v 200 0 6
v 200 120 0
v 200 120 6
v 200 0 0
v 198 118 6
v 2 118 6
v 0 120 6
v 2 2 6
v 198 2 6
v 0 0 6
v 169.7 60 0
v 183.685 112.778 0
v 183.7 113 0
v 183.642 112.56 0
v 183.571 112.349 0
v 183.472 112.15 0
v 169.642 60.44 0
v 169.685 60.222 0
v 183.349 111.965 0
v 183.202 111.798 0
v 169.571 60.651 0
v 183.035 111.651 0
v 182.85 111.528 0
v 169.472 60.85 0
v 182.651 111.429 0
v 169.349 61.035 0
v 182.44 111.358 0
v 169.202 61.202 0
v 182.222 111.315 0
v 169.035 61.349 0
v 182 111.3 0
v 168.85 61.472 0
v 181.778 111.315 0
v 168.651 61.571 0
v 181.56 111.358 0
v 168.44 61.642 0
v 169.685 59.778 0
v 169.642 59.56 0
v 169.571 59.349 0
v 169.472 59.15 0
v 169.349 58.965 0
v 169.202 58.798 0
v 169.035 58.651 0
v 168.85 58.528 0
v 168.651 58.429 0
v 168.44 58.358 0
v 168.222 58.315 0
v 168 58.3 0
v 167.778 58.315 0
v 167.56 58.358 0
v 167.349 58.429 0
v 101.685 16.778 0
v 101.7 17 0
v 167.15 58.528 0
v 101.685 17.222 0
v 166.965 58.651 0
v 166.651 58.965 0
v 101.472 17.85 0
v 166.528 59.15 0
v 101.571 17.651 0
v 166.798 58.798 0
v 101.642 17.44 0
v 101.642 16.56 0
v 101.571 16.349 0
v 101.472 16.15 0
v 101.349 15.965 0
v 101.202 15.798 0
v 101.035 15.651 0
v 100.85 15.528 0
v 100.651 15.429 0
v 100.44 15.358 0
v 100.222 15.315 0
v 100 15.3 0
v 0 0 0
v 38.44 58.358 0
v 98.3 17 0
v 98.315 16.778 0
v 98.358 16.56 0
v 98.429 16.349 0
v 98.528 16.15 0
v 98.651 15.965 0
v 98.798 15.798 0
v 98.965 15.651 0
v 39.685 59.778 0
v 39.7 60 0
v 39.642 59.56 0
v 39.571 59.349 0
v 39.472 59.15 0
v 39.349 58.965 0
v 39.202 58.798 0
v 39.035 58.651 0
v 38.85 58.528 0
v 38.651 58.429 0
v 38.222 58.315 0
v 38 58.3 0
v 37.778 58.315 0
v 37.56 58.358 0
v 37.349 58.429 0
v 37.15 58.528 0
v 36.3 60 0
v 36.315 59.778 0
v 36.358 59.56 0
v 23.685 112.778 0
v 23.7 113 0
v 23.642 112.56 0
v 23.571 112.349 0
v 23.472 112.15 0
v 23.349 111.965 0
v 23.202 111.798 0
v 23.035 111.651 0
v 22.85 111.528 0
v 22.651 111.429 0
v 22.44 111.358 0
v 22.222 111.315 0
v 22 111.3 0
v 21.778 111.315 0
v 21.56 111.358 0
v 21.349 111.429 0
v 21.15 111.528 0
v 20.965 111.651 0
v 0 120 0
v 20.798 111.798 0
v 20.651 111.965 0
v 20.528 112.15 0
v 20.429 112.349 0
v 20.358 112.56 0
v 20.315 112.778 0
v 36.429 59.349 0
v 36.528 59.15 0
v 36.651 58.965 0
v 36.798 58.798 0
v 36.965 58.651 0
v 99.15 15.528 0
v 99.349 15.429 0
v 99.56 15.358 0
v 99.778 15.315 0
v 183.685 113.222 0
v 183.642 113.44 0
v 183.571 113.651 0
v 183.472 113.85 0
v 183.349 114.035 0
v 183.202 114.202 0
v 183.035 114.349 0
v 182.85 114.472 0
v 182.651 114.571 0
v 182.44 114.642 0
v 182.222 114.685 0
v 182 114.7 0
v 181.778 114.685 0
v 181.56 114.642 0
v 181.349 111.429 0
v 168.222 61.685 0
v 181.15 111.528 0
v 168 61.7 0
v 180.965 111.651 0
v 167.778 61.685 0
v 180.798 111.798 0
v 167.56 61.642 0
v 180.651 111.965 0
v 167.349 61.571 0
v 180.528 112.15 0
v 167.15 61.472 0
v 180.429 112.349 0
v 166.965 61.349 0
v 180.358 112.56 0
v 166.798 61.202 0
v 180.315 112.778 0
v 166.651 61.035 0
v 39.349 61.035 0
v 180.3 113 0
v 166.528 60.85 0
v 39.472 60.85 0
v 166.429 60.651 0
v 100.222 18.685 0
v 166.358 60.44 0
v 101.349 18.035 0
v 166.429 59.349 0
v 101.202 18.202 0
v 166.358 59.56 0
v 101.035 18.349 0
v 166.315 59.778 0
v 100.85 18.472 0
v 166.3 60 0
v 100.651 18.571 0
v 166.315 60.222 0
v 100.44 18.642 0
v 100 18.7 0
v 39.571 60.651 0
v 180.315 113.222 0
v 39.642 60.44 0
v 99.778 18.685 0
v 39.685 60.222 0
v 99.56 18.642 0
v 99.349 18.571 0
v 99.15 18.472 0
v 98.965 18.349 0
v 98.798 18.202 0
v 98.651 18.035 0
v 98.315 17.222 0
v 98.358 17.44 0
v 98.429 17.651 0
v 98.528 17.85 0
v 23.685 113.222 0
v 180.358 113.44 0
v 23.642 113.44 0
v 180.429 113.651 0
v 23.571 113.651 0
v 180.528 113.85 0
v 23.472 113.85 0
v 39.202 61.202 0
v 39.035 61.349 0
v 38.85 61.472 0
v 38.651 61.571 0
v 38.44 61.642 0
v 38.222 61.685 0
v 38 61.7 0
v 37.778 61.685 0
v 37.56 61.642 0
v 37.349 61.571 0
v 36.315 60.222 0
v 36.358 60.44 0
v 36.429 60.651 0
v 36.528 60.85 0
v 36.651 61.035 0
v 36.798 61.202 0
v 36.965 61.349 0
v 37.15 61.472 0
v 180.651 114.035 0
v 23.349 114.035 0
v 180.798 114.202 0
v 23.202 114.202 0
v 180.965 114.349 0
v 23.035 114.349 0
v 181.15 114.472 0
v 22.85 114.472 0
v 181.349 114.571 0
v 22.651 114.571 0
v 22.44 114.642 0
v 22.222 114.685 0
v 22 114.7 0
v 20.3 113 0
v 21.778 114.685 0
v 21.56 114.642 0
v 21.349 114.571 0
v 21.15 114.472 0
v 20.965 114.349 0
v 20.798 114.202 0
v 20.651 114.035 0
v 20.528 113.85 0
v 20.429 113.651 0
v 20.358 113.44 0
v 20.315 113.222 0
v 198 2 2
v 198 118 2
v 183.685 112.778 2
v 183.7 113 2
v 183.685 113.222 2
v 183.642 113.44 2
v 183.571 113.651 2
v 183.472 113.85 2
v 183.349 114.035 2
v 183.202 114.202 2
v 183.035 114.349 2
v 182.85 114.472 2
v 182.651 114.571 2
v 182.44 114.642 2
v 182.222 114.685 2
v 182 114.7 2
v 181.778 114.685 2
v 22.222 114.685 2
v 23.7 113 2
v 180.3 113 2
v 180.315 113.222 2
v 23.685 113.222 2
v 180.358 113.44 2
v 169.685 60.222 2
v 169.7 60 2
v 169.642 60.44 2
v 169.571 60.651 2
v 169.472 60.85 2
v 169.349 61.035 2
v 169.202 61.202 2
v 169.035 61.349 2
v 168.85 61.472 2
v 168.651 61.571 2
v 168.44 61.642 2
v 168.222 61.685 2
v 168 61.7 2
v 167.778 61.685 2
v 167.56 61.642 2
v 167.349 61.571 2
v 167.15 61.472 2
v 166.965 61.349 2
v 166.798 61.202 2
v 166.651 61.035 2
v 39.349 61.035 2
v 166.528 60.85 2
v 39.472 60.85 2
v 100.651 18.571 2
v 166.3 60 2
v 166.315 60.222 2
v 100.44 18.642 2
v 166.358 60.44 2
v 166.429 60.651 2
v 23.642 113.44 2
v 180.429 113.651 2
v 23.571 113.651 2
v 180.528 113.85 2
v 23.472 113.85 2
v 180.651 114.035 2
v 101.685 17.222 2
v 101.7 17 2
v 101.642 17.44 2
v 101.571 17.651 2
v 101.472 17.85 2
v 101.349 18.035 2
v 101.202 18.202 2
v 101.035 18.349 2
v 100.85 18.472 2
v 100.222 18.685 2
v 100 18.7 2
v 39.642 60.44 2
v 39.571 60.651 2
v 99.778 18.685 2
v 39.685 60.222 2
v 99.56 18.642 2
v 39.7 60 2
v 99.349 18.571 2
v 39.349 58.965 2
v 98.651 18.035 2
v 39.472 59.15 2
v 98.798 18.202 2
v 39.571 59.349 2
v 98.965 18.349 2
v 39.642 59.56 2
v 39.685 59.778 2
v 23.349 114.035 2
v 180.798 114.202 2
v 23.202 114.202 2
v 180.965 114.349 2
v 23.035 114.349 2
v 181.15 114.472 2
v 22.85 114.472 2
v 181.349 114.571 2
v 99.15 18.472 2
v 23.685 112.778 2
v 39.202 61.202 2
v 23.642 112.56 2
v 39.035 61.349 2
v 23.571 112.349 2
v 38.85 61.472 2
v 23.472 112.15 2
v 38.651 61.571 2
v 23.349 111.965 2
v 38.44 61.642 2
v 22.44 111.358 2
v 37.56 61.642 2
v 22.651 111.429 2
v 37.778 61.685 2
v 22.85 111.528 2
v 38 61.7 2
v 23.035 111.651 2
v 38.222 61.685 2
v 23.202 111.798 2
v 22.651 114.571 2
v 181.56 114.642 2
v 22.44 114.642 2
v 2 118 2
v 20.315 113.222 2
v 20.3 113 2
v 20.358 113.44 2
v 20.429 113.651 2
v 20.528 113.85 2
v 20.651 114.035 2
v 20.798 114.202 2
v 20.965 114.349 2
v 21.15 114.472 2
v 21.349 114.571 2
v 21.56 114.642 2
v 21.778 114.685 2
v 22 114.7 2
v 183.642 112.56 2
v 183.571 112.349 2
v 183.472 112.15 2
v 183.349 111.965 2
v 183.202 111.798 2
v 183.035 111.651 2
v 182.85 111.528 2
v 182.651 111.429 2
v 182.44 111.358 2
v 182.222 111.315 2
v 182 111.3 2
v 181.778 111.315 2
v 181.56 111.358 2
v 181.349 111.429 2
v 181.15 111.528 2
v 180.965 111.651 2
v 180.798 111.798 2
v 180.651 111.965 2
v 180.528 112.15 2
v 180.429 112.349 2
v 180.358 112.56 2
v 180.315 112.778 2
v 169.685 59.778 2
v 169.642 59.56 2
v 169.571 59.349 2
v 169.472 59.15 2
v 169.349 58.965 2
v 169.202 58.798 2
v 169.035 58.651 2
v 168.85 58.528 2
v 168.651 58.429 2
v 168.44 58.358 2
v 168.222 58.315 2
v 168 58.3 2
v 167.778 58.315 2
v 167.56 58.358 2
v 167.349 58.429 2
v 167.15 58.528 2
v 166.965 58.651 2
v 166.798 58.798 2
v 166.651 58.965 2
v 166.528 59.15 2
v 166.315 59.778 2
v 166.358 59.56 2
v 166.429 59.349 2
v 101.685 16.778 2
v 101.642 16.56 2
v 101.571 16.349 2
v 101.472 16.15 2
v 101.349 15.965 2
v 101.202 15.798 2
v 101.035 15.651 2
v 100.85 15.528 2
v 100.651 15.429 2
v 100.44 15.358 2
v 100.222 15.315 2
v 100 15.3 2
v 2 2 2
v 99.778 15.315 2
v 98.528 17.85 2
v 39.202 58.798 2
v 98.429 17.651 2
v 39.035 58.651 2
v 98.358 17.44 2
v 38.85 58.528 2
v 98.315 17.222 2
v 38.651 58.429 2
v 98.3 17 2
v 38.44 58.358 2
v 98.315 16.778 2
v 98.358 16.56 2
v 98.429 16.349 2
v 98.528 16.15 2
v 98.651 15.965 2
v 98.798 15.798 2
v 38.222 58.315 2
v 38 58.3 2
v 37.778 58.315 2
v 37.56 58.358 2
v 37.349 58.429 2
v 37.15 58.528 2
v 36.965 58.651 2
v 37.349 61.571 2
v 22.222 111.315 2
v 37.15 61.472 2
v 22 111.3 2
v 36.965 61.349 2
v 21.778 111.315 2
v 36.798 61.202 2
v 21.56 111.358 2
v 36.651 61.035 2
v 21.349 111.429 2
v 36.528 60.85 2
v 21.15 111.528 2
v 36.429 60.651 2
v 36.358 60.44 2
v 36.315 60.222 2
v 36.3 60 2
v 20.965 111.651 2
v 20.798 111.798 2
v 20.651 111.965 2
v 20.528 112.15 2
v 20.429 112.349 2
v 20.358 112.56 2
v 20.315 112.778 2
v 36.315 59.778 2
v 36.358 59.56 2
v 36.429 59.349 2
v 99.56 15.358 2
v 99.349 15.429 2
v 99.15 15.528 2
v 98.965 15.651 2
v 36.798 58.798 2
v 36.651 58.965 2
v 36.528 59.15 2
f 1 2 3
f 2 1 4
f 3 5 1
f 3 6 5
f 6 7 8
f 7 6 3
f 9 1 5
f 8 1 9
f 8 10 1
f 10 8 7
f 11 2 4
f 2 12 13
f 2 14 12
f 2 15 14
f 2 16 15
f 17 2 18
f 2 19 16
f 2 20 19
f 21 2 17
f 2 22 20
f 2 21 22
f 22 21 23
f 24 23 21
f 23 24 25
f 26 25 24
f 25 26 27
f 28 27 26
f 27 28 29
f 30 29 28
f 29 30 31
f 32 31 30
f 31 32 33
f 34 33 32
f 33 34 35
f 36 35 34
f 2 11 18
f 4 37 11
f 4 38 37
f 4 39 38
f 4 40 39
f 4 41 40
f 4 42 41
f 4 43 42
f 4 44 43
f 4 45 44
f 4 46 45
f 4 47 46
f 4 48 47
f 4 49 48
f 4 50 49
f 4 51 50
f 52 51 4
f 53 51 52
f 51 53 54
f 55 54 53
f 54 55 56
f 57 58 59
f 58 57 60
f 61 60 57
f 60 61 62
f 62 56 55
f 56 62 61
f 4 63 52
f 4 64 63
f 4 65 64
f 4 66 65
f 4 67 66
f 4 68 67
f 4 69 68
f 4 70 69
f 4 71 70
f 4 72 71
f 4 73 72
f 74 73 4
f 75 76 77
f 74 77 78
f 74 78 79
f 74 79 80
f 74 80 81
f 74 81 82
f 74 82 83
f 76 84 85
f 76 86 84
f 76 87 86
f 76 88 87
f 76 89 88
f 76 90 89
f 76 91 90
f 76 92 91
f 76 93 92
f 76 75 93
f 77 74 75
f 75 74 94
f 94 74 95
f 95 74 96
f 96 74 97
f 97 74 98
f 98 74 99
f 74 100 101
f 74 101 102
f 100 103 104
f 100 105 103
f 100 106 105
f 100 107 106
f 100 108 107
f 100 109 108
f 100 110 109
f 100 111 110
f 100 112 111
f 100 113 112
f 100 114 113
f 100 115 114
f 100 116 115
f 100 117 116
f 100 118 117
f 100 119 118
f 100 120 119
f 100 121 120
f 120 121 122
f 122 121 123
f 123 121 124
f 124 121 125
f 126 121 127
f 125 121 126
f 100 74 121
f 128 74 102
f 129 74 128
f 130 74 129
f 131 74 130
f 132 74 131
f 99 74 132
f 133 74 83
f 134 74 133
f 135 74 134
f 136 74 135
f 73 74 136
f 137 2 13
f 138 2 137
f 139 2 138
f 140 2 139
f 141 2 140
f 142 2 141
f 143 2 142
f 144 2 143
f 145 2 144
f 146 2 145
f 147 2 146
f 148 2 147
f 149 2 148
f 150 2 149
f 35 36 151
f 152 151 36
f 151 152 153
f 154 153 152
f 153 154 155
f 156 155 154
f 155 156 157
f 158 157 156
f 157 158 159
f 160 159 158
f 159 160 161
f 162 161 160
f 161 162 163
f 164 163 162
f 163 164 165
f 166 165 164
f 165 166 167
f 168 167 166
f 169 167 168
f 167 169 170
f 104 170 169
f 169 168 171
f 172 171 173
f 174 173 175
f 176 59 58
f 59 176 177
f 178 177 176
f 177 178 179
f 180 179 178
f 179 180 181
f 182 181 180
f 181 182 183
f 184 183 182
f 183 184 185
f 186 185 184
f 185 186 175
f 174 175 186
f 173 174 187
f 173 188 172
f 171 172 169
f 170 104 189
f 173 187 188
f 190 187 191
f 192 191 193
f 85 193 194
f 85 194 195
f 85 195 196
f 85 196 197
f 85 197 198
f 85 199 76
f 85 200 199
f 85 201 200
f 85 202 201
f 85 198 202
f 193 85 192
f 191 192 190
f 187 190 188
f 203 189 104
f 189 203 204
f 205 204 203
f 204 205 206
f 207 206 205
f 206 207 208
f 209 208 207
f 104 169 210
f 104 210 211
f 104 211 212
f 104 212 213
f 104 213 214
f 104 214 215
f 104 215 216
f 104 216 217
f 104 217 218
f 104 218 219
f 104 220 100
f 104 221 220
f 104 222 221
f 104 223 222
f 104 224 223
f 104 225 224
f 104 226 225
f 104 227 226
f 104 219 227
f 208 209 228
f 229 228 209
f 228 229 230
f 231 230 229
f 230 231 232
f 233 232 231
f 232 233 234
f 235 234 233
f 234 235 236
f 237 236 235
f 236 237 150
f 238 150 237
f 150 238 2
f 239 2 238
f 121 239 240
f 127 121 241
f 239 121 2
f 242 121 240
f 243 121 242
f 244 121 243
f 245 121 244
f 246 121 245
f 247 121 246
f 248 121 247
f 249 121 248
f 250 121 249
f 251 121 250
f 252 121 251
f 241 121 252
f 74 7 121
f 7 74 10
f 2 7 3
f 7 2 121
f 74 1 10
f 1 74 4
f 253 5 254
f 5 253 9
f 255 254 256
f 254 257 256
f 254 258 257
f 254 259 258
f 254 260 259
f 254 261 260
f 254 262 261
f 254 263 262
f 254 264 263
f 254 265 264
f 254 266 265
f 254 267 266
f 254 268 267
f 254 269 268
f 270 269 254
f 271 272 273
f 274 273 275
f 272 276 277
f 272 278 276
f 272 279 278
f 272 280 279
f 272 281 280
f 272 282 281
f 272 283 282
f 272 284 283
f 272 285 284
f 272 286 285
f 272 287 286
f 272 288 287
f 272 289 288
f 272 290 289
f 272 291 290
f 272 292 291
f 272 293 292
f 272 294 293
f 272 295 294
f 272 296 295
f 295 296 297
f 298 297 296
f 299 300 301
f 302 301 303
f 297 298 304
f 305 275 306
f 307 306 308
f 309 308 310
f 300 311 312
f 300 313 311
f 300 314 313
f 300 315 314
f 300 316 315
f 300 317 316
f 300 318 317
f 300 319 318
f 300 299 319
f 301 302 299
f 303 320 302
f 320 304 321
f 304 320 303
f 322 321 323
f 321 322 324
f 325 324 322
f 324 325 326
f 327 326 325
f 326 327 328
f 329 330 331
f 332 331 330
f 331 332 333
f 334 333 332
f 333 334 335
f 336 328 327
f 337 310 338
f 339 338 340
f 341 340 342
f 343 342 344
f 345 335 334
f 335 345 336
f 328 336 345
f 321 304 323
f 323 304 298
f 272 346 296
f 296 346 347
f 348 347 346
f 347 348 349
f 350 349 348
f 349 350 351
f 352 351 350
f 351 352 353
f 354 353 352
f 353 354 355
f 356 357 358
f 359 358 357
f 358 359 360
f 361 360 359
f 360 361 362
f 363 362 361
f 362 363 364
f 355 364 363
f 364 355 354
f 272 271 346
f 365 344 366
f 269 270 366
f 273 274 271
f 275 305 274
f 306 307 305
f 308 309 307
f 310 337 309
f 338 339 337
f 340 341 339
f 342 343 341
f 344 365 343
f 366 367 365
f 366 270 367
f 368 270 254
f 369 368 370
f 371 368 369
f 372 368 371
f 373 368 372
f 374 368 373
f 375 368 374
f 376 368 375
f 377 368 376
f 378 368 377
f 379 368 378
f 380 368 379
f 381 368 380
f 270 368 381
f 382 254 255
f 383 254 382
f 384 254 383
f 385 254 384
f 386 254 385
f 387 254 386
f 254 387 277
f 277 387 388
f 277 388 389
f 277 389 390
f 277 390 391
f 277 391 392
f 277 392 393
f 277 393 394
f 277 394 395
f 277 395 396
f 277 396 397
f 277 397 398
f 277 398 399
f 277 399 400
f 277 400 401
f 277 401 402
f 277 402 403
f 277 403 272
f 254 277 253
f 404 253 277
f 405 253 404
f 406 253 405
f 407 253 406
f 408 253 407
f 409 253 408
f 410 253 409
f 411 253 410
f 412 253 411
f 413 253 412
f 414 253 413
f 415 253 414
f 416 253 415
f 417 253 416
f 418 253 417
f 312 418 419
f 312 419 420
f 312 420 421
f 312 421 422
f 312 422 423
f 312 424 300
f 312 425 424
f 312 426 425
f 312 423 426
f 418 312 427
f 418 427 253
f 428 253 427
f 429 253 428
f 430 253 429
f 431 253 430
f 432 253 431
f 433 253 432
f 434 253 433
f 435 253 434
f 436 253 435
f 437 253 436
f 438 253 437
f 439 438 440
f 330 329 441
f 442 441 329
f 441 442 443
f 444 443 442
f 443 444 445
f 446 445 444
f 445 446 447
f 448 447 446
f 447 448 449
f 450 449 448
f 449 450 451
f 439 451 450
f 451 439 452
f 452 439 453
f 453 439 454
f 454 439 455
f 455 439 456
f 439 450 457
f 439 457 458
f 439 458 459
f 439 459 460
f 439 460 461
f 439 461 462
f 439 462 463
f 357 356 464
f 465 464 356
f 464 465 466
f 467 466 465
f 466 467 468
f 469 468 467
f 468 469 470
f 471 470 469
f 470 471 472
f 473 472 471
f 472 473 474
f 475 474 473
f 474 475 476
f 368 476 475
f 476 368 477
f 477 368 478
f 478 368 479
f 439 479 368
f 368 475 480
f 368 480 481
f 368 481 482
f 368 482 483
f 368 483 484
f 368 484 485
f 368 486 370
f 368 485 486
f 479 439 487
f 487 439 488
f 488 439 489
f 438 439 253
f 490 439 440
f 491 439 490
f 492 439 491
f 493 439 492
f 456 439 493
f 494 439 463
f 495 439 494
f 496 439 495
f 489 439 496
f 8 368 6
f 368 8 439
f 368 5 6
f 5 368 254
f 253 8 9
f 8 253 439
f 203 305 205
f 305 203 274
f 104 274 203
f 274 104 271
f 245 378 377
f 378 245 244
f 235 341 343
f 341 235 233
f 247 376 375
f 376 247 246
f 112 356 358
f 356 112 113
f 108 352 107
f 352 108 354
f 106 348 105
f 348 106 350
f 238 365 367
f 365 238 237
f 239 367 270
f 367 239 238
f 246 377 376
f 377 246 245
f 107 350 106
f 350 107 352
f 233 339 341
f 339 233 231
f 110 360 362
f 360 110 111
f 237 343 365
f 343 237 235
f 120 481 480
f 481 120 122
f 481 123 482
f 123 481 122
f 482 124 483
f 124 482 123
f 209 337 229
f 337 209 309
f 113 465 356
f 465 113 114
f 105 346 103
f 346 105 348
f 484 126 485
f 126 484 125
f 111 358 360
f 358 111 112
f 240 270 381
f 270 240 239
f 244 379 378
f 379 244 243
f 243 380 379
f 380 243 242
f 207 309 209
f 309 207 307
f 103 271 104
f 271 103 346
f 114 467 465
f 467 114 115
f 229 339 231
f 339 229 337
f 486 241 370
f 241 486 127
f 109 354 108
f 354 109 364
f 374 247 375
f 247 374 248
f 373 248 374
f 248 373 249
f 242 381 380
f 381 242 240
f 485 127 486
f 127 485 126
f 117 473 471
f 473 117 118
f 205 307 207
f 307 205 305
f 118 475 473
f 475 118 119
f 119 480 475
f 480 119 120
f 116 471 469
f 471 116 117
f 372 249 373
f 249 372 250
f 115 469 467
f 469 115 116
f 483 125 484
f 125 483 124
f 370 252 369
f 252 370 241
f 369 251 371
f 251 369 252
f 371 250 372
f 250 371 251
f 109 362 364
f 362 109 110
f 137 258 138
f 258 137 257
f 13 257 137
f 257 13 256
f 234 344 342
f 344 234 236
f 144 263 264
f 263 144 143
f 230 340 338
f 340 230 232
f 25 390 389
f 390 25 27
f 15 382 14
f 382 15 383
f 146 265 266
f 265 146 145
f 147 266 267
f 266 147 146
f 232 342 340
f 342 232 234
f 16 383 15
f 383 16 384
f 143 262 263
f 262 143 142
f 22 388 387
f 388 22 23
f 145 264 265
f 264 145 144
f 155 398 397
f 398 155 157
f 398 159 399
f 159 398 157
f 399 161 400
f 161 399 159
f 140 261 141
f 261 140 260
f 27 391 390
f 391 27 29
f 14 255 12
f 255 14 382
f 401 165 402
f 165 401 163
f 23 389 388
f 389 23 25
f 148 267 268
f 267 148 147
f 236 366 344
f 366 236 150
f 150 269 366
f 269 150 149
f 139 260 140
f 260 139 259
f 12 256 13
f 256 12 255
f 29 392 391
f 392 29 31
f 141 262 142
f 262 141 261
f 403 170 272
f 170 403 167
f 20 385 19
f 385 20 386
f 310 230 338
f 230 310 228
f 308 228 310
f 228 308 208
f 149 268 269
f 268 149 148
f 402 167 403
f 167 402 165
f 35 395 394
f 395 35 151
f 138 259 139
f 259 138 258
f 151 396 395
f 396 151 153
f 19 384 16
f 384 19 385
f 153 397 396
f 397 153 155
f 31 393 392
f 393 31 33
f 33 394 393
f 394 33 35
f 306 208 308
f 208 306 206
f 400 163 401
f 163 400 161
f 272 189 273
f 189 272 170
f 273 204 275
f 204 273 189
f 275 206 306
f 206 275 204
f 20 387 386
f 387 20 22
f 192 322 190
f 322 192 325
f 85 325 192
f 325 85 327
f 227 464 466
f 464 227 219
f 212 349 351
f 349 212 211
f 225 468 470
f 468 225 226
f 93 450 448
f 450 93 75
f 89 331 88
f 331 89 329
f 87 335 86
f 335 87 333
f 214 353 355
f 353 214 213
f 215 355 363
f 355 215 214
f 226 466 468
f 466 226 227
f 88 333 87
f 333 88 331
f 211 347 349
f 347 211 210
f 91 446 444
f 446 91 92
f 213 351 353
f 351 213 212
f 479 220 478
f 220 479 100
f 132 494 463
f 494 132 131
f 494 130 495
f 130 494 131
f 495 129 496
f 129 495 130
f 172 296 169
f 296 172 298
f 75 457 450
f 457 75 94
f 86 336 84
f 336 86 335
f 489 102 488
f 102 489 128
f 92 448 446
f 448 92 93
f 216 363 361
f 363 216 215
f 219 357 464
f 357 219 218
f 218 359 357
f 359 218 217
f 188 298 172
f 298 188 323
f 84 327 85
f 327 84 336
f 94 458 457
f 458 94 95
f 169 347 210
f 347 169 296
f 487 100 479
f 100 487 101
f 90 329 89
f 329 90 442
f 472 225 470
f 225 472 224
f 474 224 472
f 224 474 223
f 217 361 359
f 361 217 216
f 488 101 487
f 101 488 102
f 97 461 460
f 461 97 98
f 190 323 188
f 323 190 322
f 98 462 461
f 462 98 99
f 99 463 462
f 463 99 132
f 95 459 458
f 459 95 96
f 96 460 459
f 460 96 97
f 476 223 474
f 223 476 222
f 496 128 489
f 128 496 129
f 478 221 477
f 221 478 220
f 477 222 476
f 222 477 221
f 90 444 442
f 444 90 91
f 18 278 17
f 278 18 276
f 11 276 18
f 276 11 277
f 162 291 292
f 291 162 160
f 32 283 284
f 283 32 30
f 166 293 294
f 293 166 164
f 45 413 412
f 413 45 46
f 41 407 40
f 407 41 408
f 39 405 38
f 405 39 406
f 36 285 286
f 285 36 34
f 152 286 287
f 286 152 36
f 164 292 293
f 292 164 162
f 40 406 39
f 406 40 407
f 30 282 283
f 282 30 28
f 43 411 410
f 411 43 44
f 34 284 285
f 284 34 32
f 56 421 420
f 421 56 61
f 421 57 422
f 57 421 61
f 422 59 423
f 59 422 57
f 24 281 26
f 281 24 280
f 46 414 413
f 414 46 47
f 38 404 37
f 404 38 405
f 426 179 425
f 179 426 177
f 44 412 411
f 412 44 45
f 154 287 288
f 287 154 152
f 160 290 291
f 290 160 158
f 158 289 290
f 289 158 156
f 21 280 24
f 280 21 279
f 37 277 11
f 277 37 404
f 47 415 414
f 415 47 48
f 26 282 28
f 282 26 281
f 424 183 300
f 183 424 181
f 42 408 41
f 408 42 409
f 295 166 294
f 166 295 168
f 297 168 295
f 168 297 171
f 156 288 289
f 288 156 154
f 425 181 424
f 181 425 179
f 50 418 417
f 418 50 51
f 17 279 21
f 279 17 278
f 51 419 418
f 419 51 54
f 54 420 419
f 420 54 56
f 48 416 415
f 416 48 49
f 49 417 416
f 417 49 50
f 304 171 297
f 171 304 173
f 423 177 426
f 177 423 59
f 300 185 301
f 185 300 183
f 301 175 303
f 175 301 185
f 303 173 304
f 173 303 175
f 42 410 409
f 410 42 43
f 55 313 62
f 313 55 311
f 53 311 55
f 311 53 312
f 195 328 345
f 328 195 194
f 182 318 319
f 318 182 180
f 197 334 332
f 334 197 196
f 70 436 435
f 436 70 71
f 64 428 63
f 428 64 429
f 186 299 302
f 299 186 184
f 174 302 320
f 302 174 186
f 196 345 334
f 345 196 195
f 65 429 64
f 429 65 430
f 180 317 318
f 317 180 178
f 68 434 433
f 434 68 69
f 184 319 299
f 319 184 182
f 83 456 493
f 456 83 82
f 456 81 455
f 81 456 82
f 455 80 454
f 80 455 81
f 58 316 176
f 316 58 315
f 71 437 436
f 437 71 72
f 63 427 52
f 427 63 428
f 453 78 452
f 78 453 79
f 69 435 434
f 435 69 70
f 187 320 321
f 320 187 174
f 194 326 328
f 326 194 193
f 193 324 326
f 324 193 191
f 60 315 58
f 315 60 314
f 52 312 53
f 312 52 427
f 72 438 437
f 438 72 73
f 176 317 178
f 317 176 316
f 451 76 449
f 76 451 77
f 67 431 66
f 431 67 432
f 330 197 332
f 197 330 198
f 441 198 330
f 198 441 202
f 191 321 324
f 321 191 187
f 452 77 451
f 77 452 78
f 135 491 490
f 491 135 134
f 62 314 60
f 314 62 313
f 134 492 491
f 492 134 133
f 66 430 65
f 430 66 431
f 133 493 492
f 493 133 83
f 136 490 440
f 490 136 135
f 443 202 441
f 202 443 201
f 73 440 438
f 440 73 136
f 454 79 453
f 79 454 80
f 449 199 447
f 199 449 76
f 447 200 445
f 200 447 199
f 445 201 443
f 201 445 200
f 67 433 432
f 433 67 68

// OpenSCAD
// file: desk_organizer.scad
// Desk Organizer — Portacosas
// Parametric modular desk organizer with snap-fit tray system
// render_mode selects part: 0=tray_base, 1=pen_holder, 2=phone_stand,
//                           3=card_slot, 4=cable_clip, 5=label_plate

// --- Parameters ---
render_mode = 0;

// Tray dimensions
tray_width = 200;
tray_depth = 120;
wall_height = 80;
wall_thickness = 2.0;

// Pen holder
pen_count = 5;
pen_diameter = 12;
pen_style = false; // false=round, true=hex

// Phone stand
phone_width = 75;
phone_angle = 65;
charging_slot = true;

// Card slot
card_width = 90;
card_depth = 60;
card_angle = 10;

// Cable clip
clip_count = 2;
clip_diameter = 6;

// Personalization
label_text = "QUBIC";
label_depth = 0.5;

// Grid (used by grid.scad)
rows = 1;
cols = 1;

// Resolution
$fn = 48;

// --- Derived ---
snap_size = 3;        // snap-fit nub size
snap_tol = 0.2;       // snap-fit tolerance
base_h = wall_thickness;  // tray floor thickness
pen_holder_w = pen_count * (pen_diameter + wall_thickness) + wall_thickness;
pen_holder_d = pen_diameter + wall_thickness * 2;

// --- Snap-fit socket/nub helpers ---
module snap_nub(h=snap_size) {
    cylinder(d1=snap_size, d2=snap_size*0.6, h=h);
}

module snap_socket(h=snap_size) {
    cylinder(d=snap_size + snap_tol*2, h=h+0.1);
}

// --- Tray Base ---
module tray_base() {
    difference() {
        union() {
            // Floor plate
            cube([tray_width, tray_depth, base_h]);
            // Low perimeter lip
            difference() {
                cube([tray_width, tray_depth, base_h + 4]);
                translate([wall_thickness, wall_thickness, base_h])
                    cube([tray_width - wall_thickness*2,
                          tray_depth - wall_thickness*2,
                          5]);
            }
        }
        // Snap-fit sockets for components
        // Pen holder socket — left side
        translate([wall_thickness + pen_holder_w/2,
                   tray_depth/2, -0.05])
            snap_socket(base_h + 0.1);
        // Phone stand socket — right side
        translate([tray_width - wall_thickness - 30,
                   tray_depth/2, -0.05])
            snap_socket(base_h + 0.1);
        // Card slot socket — front center
        translate([tray_width/2,
                   wall_thickness + 15, -0.05])
            snap_socket(base_h + 0.1);
        // Cable clip sockets — back edge
        for (i = [0 : clip_count - 1]) {
            translate([wall_thickness + 20 + i * (tray_width - 40) / max(clip_count - 1, 1),
                       tray_depth - wall_thickness - 5, -0.05])
                snap_socket(base_h + 0.1);
        }
    }
}

// --- Pen Holder ---
module pen_holder() {
    holder_h = wall_height * 0.7;
    difference() {
        // Outer shell
        if (pen_style) {
            // Hex grid container
            cube([pen_holder_w, pen_holder_d, holder_h]);
        } else {
            cube([pen_holder_w, pen_holder_d, holder_h]);
        }
        // Pen bores
        for (i = [0 : pen_count - 1]) {
            px = wall_thickness + pen_diameter/2 + i * (pen_diameter + wall_thickness);
            py = pen_holder_d / 2;
            translate([px, py, wall_thickness]) {
                if (pen_style) {
                    // Hexagonal bore
                    cylinder(d=pen_diameter, h=holder_h, $fn=6);
                } else {
                    cylinder(d=pen_diameter, h=holder_h);
                }
            }
        }
    }
    // Snap nub on bottom
    translate([pen_holder_w/2, pen_holder_d/2, 0])
        mirror([0,0,1]) snap_nub();
}

// --- Phone Stand ---
module phone_stand() {
    stand_d = 40;
    stand_h = wall_height * 0.8;
    lip_h = 10;

    difference() {
        union() {
            // Back angled support — hull for smooth cradle
            hull() {
                cube([phone_width, wall_thickness, stand_h]);
                translate([0, stand_d, 0])
                    cube([phone_width, wall_thickness, lip_h]);
            }
            // Bottom platform
            cube([phone_width, stand_d + wall_thickness, wall_thickness]);
            // Front lip
            translate([0, stand_d, 0])
                cube([phone_width, wall_thickness, lip_h]);
        }
        // Charging slot cutout
        if (charging_slot) {
            slot_w = 25;
            slot_h = 8;
            translate([(phone_width - slot_w)/2, -0.1, wall_thickness])
                cube([slot_w, wall_thickness + 0.2, slot_h]);
            translate([(phone_width - slot_w)/2, -0.1, wall_thickness])
                cube([slot_w, stand_d * 0.3, slot_h]);
        }
    }
    // Snap nub on bottom center
    translate([phone_width/2, stand_d/2, 0])
        mirror([0,0,1]) snap_nub();
}

// --- Card Slot ---
module card_slot() {
    slot_h = wall_height * 0.4;
    difference() {
        // Angled pocket
        hull() {
            cube([card_width, wall_thickness, slot_h]);
            translate([0, card_depth, 0])
                cube([card_width, wall_thickness, slot_h * 0.3]);
        }
        // Interior cutout
        translate([wall_thickness, wall_thickness, wall_thickness])
            hull() {
                cube([card_width - wall_thickness*2, 0.1, slot_h - wall_thickness]);
                translate([0, card_depth - wall_thickness, 0])
                    cube([card_width - wall_thickness*2, 0.1,
                          slot_h * 0.3 - wall_thickness]);
            }
    }
    // Bottom platform
    cube([card_width, card_depth + wall_thickness, wall_thickness]);
    // Snap nub
    translate([card_width/2, card_depth/2, 0])
        mirror([0,0,1]) snap_nub();
}

// --- Cable Clip ---
module cable_clip() {
    clip_h = 15;
    clip_w = clip_diameter + wall_thickness * 2;
    gap = clip_diameter * 0.4; // opening gap

    difference() {
        cylinder(d=clip_w, h=clip_h);
        // Cable bore
        translate([0, 0, wall_thickness])
            cylinder(d=clip_diameter, h=clip_h);
        // C-shaped opening
        translate([0, clip_w/2, wall_thickness + clip_h * 0.3])
            cube([gap, clip_w, clip_h], center=true);
    }
    // Base pad
    translate([-clip_w/2, -clip_w/2, 0])
        cube([clip_w, clip_w, wall_thickness]);
    // Snap nub
    mirror([0,0,1]) snap_nub();
}

// --- Label Plate ---
module label_plate() {
    plate_w = tray_width * 0.4;
    plate_h = 12;
    plate_d = wall_thickness;

    difference() {
        cube([plate_w, plate_d, plate_h]);
        // Embossed text
        translate([plate_w/2, -0.01, plate_h/2])
            rotate([90, 0, 180])
                linear_extrude(height=label_depth + 0.01)
                    text(label_text, size=plate_h * 0.6,
                         halign="center", valign="center",
                         font="Liberation Sans:style=Bold");
    }
}

// --- Render Selector ---
if (render_mode == 0) tray_base();
if (render_mode == 1) pen_holder();
if (render_mode == 2) phone_stand();
if (render_mode == 3) card_slot();
if (render_mode == 4) cable_clip();
if (render_mode == 5) label_plate();
// main file
// Grid — Portacosas
// Tiled tray system: rows × cols array with snap-fit connectors

include <desk_organizer.scad>

// Grid parameters (overridden by manifest)
rows = 1;
cols = 1;

// Connector dimensions
connector_w = 10;
connector_h = 4;
connector_d = 8;

// Grid spacing
grid_gap = 2; // gap between tiles

// --- Connector modules ---
module grid_connector_male() {
    translate([0, 0, 0])
        cube([connector_w, connector_d, connector_h]);
    // Snap ridge
    translate([connector_w * 0.2, connector_d, connector_h * 0.3])
        cube([connector_w * 0.6, 1, connector_h * 0.4]);
}

module grid_connector_female() {
    translate([0, 0, -0.05])
        cube([connector_w + snap_tol*2,
              connector_d + snap_tol*2,
              connector_h + 0.1]);
    // Snap ridge slot
    translate([connector_w * 0.2 - snap_tol, connector_d,
               connector_h * 0.3 - snap_tol])
        cube([connector_w * 0.6 + snap_tol*2,
              1 + snap_tol*2,
              connector_h * 0.4 + snap_tol*2]);
}

// --- Grid Assembly ---
for (r = [0 : rows - 1]) {
    for (c = [0 : cols - 1]) {
        translate([c * (tray_width + grid_gap),
                   r * (tray_depth + grid_gap),
                   0]) {
            difference() {
                tray_base();
                // Female connectors on right edge (except last col)
                if (c < cols - 1) {
                    translate([tray_width - 0.1,
                               (tray_depth - connector_d) / 2,
                               0])
                        grid_connector_female();
                }
                // Female connectors on top edge (except last row)
                if (r < rows - 1) {
                    translate([(tray_width - connector_w) / 2,
                               tray_depth - 0.1,
                               0])
                        rotate([0, 0, 0])
                            grid_connector_female();
                }
            }
            // Male connectors on left edge (except first col)
            if (c > 0) {
                translate([-grid_gap,
                           (tray_depth - connector_d) / 2,
                           0])
                    grid_connector_male();
            }
            // Male connectors on bottom edge (except first row)
            if (r > 0) {
                translate([(tray_width - connector_w) / 2,
                           -grid_gap,
                           0])
                    grid_connector_male();
            }
        }
    }
}
